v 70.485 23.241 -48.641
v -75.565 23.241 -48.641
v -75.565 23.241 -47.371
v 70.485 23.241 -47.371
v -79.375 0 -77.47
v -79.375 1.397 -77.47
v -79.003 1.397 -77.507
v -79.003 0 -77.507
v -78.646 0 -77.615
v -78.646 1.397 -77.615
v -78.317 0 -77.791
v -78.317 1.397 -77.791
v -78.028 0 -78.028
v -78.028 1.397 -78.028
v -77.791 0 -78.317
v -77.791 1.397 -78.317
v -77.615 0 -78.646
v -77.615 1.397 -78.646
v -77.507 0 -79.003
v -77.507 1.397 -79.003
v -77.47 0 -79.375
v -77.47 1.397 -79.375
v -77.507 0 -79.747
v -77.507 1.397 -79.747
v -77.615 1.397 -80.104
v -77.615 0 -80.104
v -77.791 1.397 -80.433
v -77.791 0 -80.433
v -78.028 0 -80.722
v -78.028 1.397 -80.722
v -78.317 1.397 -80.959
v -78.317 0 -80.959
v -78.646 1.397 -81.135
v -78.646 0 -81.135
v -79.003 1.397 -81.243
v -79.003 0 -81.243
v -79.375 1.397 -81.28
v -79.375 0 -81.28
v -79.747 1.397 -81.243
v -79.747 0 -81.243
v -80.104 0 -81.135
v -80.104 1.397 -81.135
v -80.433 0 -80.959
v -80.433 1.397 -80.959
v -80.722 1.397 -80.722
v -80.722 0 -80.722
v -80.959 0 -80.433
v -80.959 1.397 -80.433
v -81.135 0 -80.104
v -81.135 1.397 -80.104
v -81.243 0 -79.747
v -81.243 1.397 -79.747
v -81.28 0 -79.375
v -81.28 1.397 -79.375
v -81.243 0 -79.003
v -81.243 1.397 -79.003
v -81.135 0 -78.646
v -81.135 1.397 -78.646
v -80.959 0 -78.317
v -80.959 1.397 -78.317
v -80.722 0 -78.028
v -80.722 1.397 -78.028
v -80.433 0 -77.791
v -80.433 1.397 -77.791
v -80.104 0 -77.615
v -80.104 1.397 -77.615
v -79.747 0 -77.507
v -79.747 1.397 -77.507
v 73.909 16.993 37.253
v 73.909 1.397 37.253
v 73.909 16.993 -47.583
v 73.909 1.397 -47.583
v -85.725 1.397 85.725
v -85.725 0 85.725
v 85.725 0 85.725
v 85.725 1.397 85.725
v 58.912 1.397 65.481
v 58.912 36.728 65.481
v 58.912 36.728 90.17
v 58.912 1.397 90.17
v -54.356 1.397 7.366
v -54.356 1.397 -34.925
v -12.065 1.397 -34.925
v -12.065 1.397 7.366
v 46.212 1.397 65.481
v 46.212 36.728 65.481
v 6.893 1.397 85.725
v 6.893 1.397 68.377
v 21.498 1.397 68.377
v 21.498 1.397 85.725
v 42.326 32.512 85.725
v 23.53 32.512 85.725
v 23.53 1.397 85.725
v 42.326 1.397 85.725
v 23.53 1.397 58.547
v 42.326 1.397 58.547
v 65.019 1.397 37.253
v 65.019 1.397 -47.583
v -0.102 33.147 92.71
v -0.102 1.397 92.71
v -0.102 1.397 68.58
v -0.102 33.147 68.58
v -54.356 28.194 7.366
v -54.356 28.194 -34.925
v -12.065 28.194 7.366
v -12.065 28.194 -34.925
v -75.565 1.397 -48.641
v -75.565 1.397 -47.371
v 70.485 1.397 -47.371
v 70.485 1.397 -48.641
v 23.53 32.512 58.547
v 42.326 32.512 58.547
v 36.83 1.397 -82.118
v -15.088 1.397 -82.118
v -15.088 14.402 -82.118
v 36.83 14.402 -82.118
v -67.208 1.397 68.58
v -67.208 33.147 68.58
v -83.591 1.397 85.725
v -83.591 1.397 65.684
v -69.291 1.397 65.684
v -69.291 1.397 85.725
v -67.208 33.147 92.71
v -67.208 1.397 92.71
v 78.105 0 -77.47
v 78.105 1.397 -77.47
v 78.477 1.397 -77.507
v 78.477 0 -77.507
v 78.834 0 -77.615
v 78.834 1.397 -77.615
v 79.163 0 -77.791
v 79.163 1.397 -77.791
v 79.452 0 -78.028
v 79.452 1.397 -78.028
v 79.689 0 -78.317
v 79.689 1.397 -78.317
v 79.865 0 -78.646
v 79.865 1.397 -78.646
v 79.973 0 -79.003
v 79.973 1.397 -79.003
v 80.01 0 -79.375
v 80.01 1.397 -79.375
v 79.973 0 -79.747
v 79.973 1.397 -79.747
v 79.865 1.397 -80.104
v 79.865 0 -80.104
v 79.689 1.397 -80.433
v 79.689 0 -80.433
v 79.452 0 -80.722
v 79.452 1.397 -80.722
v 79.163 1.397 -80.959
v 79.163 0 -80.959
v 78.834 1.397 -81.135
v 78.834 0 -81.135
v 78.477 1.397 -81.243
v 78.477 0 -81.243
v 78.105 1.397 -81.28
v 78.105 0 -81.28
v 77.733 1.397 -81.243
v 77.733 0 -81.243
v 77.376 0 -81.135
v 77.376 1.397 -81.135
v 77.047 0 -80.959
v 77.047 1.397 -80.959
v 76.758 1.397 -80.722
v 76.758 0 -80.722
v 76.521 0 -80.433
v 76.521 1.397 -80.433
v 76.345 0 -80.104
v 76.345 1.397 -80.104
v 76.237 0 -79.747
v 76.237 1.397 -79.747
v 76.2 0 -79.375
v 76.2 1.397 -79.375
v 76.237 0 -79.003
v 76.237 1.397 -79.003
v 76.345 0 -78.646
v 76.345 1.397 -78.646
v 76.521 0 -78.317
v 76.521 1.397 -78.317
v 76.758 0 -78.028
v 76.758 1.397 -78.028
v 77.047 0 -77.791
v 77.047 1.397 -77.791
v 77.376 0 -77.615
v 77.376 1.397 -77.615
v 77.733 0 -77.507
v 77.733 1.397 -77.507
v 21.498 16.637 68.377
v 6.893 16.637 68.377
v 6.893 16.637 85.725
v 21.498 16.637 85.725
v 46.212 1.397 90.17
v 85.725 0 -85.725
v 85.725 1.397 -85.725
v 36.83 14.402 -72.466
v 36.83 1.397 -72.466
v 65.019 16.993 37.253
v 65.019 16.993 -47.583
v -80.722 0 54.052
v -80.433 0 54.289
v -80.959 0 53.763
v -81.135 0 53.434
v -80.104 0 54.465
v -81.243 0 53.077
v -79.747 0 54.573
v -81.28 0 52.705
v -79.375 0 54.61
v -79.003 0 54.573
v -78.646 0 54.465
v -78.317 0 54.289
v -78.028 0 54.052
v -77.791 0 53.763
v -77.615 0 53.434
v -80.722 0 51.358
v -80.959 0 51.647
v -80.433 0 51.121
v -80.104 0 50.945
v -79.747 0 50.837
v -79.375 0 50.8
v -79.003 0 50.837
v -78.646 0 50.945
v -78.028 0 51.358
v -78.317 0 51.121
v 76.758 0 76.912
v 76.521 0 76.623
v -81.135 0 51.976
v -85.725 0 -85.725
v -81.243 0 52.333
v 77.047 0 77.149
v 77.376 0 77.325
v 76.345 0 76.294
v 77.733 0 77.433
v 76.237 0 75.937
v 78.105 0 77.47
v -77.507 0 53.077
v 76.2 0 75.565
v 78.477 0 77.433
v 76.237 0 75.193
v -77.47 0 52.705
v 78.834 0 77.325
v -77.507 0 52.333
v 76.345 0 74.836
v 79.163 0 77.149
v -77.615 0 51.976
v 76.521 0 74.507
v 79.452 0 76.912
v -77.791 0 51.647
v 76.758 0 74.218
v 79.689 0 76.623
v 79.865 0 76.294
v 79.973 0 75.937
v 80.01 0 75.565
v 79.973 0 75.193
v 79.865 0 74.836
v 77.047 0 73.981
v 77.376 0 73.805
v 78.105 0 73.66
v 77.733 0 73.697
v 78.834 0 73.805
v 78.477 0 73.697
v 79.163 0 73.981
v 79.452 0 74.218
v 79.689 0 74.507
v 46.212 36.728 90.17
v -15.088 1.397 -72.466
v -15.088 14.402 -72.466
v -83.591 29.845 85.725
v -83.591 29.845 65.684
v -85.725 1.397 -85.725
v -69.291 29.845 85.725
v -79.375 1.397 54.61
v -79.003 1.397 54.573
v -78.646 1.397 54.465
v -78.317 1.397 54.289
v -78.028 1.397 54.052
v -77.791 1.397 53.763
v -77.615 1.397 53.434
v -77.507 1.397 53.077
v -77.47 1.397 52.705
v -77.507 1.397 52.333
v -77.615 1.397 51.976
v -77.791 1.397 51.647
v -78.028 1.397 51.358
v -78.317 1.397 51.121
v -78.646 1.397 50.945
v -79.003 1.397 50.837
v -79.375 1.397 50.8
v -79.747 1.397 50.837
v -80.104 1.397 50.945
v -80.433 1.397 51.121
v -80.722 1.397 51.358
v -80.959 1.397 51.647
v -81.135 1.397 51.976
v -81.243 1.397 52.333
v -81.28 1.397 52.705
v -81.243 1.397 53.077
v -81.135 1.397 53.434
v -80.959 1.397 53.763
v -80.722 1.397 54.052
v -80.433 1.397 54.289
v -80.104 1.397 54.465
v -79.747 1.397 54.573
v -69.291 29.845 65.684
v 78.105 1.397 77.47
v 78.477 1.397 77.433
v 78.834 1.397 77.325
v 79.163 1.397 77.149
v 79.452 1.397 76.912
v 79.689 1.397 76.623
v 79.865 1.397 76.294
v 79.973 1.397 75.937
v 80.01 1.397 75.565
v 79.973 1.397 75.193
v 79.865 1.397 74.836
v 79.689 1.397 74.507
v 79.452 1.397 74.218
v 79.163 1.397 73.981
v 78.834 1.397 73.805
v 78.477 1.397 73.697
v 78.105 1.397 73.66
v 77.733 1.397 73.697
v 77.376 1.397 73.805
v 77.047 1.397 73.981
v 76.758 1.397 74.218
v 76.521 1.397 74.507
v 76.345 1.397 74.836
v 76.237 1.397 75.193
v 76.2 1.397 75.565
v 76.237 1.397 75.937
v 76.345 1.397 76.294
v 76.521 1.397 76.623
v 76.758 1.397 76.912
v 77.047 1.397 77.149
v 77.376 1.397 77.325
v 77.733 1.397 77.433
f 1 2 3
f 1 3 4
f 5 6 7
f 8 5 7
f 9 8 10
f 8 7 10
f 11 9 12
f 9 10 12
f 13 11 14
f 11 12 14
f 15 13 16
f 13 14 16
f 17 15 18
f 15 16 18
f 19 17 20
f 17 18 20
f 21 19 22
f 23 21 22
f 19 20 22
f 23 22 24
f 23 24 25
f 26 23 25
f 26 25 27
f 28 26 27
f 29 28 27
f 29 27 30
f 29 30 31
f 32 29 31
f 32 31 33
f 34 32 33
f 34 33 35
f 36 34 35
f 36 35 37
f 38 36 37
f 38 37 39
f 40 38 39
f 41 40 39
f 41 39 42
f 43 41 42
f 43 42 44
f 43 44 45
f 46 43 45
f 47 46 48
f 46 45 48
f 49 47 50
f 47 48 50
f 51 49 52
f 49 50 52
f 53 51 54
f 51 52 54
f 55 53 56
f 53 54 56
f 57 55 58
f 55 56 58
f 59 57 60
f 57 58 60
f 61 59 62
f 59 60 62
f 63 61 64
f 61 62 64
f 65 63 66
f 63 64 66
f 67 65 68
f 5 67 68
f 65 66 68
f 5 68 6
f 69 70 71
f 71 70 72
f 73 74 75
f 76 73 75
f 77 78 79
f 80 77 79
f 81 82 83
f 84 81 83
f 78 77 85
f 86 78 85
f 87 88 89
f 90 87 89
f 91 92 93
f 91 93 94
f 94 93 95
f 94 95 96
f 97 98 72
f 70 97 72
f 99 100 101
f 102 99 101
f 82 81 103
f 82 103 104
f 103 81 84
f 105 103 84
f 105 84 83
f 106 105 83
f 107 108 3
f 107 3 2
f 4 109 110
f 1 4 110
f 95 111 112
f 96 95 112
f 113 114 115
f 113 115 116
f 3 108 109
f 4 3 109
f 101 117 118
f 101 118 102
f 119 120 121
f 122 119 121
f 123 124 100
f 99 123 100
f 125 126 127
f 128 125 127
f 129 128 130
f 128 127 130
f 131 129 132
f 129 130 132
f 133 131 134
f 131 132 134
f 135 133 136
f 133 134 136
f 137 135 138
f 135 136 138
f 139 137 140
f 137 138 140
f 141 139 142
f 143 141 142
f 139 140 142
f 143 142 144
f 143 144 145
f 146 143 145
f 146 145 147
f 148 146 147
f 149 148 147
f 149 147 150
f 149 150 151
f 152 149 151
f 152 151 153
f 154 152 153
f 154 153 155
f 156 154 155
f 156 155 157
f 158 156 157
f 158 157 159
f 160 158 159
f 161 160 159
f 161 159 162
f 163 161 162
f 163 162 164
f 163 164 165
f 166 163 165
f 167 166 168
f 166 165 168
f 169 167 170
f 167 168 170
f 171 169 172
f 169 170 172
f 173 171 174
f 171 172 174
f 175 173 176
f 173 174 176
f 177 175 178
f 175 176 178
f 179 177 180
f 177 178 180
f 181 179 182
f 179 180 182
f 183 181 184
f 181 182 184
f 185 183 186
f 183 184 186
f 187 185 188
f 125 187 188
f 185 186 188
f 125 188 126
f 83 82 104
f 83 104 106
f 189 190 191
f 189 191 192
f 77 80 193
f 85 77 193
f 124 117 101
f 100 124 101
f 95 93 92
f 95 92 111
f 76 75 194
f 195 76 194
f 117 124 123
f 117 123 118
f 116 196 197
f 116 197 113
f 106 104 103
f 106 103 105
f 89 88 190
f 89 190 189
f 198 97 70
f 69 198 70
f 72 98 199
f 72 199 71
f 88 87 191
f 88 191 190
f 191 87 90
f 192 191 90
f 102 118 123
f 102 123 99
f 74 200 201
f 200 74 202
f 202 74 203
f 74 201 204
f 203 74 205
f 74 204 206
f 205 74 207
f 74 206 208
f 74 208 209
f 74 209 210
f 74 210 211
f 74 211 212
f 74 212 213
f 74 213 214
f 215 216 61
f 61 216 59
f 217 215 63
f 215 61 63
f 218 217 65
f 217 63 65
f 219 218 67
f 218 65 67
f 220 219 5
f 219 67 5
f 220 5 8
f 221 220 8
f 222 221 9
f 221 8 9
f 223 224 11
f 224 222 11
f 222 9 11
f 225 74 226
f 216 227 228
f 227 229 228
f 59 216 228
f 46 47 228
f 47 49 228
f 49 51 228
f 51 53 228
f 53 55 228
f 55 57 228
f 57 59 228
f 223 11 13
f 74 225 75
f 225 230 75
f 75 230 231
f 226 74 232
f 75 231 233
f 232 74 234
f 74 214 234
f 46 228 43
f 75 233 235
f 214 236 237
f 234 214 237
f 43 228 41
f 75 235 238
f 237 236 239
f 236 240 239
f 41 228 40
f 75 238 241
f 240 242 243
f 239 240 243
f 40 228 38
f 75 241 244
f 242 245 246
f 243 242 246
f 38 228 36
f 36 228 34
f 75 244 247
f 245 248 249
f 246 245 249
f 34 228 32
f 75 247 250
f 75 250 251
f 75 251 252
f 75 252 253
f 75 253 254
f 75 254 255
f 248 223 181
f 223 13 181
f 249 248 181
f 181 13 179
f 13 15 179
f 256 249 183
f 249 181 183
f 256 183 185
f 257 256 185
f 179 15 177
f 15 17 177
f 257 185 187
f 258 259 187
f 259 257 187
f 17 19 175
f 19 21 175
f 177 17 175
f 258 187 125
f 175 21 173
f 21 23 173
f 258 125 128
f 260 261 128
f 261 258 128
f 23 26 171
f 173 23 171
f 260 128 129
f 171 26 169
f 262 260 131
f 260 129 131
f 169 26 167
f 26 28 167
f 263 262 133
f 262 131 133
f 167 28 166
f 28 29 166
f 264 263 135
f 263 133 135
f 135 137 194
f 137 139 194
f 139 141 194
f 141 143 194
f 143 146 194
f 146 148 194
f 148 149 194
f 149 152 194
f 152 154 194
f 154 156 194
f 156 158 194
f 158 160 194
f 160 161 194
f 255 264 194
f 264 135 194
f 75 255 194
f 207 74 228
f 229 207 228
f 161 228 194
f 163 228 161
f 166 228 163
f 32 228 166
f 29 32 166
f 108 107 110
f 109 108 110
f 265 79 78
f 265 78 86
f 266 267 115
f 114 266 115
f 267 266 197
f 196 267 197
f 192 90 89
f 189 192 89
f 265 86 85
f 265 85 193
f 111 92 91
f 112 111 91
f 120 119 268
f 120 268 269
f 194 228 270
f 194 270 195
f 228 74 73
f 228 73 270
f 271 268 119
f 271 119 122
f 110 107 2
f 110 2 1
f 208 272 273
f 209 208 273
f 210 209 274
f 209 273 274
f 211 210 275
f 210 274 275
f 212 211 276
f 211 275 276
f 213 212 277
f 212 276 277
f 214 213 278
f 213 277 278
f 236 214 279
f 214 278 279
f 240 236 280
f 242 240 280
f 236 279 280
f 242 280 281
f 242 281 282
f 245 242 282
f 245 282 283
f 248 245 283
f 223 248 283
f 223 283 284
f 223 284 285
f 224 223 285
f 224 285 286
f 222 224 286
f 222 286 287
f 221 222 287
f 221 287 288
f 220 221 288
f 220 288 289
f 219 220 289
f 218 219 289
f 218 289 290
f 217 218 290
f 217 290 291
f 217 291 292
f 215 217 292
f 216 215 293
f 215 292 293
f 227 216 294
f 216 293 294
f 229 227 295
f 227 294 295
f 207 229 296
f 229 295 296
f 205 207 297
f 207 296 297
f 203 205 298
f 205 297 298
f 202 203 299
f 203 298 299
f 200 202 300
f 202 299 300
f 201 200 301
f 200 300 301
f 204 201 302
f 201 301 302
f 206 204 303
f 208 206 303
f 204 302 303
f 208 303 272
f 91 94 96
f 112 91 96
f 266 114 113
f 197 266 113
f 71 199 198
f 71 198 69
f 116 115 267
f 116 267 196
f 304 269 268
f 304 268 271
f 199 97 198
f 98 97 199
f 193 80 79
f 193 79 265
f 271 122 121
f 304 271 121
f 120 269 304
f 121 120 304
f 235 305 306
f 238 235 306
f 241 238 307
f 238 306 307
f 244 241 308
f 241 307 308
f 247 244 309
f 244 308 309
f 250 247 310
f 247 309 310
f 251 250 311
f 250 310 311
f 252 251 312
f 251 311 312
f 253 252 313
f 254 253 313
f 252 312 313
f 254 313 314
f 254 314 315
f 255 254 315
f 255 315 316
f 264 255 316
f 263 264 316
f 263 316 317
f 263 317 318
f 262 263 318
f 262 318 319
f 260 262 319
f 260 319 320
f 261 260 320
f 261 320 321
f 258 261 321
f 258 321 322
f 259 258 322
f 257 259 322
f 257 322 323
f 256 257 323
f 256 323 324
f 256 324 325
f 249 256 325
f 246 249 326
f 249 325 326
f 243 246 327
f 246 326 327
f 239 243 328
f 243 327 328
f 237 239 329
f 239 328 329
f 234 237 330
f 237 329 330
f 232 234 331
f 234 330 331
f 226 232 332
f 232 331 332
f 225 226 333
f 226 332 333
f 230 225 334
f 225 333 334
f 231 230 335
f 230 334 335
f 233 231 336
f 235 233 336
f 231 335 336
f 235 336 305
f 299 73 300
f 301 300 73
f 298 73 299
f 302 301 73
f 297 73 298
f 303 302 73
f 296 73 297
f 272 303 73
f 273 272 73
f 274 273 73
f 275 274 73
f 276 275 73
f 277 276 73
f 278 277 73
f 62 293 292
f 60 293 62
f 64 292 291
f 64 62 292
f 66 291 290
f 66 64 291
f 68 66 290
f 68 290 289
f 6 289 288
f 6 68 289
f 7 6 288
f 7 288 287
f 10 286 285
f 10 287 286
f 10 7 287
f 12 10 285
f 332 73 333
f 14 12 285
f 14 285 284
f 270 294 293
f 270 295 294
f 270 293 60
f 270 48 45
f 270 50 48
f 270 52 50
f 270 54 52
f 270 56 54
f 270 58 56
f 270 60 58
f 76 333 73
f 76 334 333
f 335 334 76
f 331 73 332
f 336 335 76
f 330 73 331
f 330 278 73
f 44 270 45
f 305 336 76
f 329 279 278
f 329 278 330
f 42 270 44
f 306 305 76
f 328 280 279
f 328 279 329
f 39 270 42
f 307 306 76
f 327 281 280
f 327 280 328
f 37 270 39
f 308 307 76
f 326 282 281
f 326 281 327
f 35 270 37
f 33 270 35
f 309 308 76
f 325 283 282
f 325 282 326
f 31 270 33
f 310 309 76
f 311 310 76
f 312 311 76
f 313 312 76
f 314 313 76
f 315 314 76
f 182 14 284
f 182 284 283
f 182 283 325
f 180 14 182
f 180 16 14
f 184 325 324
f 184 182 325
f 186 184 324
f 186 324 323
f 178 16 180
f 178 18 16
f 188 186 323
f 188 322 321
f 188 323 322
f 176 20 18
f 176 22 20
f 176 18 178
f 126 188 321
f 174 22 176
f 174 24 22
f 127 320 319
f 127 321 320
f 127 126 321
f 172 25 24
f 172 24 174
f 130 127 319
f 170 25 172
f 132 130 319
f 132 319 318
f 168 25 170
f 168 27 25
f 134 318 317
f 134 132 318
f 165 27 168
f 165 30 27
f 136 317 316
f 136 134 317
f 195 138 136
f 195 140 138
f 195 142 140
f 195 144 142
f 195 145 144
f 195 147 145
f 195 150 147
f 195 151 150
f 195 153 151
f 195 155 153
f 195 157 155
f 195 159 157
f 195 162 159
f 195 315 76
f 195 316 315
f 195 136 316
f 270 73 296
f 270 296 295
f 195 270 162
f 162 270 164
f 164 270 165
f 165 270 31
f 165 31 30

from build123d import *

# Parameters (mm, degrees)
SKETCH1_W           = 171.45
SKETCH1_H           = 171.45
PCB_DEPTH           = 1.397
SKETCH2_W           = 14.3002
SKETCH2_H           = 20.0406
PS2_DEPTH           = 28.448
SKETCH3_W           = 67.1068
SKETCH3_H           = 24.13
VGA_DEPTH           = 31.75
SKETCH4_W           = 14.605
SKETCH4_H           = 17.3482
USB_DEPTH           = 15.24
SKETCH5_W           = 18.796
SKETCH5_H           = 27.178
ETHERNETUSB_DEPTH   = 31.115
SKETCH6_W           = 12.7
SKETCH6_H           = 24.6888
AUDIO_DEPTH         = 35.3314
SKETCH7_W           = 42.291
SKETCH7_H           = 42.291
HEATSINK_DEPTH      = 26.797
SKETCH8_W           = 8.89
SKETCH8_H           = 84.836
BOSS_EXTRUDE8_DEPTH = 15.5956
SKETCH9_W           = 51.9176
SKETCH9_H           = 9.652
BOSS_EXTRUDE9_DEPTH = 13.0048
SKETCH10_R          = 1.905
HOLES_DEPTH         = 132.119134954
SKETCH11_W          = 146.05
SKETCH11_H          = 1.27
RAM_DEPTH           = 21.844


with BuildPart() as part:
    # Sketch1 → PCB (new body)
    with BuildSketch(Plane(origin=(0, 0, 0), x_dir=(1, 0, 0), z_dir=(0, 1, 0))):
        Rectangle(SKETCH1_W, SKETCH1_H)
    extrude(amount=PCB_DEPTH)

    # Sketch10 → Holes (cut, through all)
    with BuildSketch(Plane(origin=(0, 1.397, 0), x_dir=(1, 0, 0), z_dir=(0, 1, 0))):
        with Locations(Location((-79.375, 79.375, 0), (0, 0, 270))):
            Circle(SKETCH10_R)
        with Locations(Location((78.105, 79.375, 0), (0, 0, 270))):
            Circle(SKETCH10_R)
        with Locations(Location((78.105, -75.565, 0), (0, 0, 270))):
            Circle(SKETCH10_R)
        with Locations(Location((-79.375, -52.705, 0), (0, 0, 270))):
            Circle(SKETCH10_R)
    extrude(amount=-HOLES_DEPTH, mode=Mode.SUBTRACT)


with BuildPart() as body_2:
    # Sketch2 → PS2 (new body)
    with BuildSketch(Plane(origin=(0, 1.397, 0), x_dir=(1, 0, 0), z_dir=(0, 1, 0))):
        with Locations((-76.4413, -75.7047)):
            Rectangle(SKETCH2_W, SKETCH2_H)
    extrude(amount=PS2_DEPTH)


with BuildPart() as body_3:
    # Sketch3 → VGA (new body)
    with BuildSketch(Plane(origin=(0, 1.397, 0), x_dir=(1, 0, 0), z_dir=(0, 1, 0))):
        with Locations((-33.655, -80.645)):
            Rectangle(SKETCH3_W, SKETCH3_H)
    extrude(amount=VGA_DEPTH)


with BuildPart() as body_4:
    # Sketch4 → USB (new body)
    with BuildSketch(Plane(origin=(0, 1.397, 0), x_dir=(1, 0, 0), z_dir=(0, 1, 0))):
        with Locations((14.195428723, -77.0509)):
            Rectangle(SKETCH4_W, SKETCH4_H)
    extrude(amount=USB_DEPTH)


with BuildPart() as body_5:
    # Sketch5 → EthernetUSB (new body)
    with BuildSketch(Plane(origin=(0, 1.397, 0), x_dir=(1, 0, 0), z_dir=(0, 1, 0))):
        with Locations((32.927928723, -72.136)):
            Rectangle(SKETCH5_W, SKETCH5_H)
    extrude(amount=ETHERNETUSB_DEPTH)


with BuildPart() as body_6:
    # Sketch6 → Audio (new body)
    with BuildSketch(Plane(origin=(0, 1.397, 0), x_dir=(-1, 0, 0), z_dir=(0, 1, 0))):
        with Locations((-52.562128723, 77.8256)):
            Rectangle(SKETCH6_W, SKETCH6_H)
    extrude(amount=AUDIO_DEPTH)


with BuildPart() as body_7:
    # Sketch7 → Heatsink (new body)
    with BuildSketch(Plane(origin=(0, 1.397, 0), x_dir=(1, 0, 0), z_dir=(0, 1, 0))):
        with Locations((-33.2105, 13.7795)):
            Rectangle(SKETCH7_W, SKETCH7_H)
    extrude(amount=HEATSINK_DEPTH)


with BuildPart() as body_8:
    # Sketch8 → Boss-Extrude8 (new body)
    with BuildSketch(Plane(origin=(0, 1.397, 0), x_dir=(1, 0, 0), z_dir=(0, 1, 0))):
        with Locations((69.463763958, 5.164723832)):
            Rectangle(SKETCH8_W, SKETCH8_H)
    extrude(amount=BOSS_EXTRUDE8_DEPTH)


with BuildPart() as body_9:
    # Sketch9 → Boss-Extrude9 (new body)
    with BuildSketch(Plane(origin=(0, 1.397, 0), x_dir=(1, 0, 0), z_dir=(0, 1, 0))):
        with Locations((10.8712, 77.2922)):
            Rectangle(SKETCH9_W, SKETCH9_H)
    extrude(amount=BOSS_EXTRUDE9_DEPTH)


with BuildPart() as body_10:
    # Sketch11 → RAM (new body)
    with BuildSketch(Plane(origin=(0, 1.397, 0), x_dir=(1, 0, 0), z_dir=(0, 1, 0))):
        with Locations((-2.54, 48.006)):
            Rectangle(SKETCH11_W, SKETCH11_H)
    extrude(amount=RAM_DEPTH)


solid = Compound([part.part, body_2.part, body_3.part, body_4.part, body_5.part, body_6.part, body_7.part, body_8.part, body_9.part, body_10.part])
